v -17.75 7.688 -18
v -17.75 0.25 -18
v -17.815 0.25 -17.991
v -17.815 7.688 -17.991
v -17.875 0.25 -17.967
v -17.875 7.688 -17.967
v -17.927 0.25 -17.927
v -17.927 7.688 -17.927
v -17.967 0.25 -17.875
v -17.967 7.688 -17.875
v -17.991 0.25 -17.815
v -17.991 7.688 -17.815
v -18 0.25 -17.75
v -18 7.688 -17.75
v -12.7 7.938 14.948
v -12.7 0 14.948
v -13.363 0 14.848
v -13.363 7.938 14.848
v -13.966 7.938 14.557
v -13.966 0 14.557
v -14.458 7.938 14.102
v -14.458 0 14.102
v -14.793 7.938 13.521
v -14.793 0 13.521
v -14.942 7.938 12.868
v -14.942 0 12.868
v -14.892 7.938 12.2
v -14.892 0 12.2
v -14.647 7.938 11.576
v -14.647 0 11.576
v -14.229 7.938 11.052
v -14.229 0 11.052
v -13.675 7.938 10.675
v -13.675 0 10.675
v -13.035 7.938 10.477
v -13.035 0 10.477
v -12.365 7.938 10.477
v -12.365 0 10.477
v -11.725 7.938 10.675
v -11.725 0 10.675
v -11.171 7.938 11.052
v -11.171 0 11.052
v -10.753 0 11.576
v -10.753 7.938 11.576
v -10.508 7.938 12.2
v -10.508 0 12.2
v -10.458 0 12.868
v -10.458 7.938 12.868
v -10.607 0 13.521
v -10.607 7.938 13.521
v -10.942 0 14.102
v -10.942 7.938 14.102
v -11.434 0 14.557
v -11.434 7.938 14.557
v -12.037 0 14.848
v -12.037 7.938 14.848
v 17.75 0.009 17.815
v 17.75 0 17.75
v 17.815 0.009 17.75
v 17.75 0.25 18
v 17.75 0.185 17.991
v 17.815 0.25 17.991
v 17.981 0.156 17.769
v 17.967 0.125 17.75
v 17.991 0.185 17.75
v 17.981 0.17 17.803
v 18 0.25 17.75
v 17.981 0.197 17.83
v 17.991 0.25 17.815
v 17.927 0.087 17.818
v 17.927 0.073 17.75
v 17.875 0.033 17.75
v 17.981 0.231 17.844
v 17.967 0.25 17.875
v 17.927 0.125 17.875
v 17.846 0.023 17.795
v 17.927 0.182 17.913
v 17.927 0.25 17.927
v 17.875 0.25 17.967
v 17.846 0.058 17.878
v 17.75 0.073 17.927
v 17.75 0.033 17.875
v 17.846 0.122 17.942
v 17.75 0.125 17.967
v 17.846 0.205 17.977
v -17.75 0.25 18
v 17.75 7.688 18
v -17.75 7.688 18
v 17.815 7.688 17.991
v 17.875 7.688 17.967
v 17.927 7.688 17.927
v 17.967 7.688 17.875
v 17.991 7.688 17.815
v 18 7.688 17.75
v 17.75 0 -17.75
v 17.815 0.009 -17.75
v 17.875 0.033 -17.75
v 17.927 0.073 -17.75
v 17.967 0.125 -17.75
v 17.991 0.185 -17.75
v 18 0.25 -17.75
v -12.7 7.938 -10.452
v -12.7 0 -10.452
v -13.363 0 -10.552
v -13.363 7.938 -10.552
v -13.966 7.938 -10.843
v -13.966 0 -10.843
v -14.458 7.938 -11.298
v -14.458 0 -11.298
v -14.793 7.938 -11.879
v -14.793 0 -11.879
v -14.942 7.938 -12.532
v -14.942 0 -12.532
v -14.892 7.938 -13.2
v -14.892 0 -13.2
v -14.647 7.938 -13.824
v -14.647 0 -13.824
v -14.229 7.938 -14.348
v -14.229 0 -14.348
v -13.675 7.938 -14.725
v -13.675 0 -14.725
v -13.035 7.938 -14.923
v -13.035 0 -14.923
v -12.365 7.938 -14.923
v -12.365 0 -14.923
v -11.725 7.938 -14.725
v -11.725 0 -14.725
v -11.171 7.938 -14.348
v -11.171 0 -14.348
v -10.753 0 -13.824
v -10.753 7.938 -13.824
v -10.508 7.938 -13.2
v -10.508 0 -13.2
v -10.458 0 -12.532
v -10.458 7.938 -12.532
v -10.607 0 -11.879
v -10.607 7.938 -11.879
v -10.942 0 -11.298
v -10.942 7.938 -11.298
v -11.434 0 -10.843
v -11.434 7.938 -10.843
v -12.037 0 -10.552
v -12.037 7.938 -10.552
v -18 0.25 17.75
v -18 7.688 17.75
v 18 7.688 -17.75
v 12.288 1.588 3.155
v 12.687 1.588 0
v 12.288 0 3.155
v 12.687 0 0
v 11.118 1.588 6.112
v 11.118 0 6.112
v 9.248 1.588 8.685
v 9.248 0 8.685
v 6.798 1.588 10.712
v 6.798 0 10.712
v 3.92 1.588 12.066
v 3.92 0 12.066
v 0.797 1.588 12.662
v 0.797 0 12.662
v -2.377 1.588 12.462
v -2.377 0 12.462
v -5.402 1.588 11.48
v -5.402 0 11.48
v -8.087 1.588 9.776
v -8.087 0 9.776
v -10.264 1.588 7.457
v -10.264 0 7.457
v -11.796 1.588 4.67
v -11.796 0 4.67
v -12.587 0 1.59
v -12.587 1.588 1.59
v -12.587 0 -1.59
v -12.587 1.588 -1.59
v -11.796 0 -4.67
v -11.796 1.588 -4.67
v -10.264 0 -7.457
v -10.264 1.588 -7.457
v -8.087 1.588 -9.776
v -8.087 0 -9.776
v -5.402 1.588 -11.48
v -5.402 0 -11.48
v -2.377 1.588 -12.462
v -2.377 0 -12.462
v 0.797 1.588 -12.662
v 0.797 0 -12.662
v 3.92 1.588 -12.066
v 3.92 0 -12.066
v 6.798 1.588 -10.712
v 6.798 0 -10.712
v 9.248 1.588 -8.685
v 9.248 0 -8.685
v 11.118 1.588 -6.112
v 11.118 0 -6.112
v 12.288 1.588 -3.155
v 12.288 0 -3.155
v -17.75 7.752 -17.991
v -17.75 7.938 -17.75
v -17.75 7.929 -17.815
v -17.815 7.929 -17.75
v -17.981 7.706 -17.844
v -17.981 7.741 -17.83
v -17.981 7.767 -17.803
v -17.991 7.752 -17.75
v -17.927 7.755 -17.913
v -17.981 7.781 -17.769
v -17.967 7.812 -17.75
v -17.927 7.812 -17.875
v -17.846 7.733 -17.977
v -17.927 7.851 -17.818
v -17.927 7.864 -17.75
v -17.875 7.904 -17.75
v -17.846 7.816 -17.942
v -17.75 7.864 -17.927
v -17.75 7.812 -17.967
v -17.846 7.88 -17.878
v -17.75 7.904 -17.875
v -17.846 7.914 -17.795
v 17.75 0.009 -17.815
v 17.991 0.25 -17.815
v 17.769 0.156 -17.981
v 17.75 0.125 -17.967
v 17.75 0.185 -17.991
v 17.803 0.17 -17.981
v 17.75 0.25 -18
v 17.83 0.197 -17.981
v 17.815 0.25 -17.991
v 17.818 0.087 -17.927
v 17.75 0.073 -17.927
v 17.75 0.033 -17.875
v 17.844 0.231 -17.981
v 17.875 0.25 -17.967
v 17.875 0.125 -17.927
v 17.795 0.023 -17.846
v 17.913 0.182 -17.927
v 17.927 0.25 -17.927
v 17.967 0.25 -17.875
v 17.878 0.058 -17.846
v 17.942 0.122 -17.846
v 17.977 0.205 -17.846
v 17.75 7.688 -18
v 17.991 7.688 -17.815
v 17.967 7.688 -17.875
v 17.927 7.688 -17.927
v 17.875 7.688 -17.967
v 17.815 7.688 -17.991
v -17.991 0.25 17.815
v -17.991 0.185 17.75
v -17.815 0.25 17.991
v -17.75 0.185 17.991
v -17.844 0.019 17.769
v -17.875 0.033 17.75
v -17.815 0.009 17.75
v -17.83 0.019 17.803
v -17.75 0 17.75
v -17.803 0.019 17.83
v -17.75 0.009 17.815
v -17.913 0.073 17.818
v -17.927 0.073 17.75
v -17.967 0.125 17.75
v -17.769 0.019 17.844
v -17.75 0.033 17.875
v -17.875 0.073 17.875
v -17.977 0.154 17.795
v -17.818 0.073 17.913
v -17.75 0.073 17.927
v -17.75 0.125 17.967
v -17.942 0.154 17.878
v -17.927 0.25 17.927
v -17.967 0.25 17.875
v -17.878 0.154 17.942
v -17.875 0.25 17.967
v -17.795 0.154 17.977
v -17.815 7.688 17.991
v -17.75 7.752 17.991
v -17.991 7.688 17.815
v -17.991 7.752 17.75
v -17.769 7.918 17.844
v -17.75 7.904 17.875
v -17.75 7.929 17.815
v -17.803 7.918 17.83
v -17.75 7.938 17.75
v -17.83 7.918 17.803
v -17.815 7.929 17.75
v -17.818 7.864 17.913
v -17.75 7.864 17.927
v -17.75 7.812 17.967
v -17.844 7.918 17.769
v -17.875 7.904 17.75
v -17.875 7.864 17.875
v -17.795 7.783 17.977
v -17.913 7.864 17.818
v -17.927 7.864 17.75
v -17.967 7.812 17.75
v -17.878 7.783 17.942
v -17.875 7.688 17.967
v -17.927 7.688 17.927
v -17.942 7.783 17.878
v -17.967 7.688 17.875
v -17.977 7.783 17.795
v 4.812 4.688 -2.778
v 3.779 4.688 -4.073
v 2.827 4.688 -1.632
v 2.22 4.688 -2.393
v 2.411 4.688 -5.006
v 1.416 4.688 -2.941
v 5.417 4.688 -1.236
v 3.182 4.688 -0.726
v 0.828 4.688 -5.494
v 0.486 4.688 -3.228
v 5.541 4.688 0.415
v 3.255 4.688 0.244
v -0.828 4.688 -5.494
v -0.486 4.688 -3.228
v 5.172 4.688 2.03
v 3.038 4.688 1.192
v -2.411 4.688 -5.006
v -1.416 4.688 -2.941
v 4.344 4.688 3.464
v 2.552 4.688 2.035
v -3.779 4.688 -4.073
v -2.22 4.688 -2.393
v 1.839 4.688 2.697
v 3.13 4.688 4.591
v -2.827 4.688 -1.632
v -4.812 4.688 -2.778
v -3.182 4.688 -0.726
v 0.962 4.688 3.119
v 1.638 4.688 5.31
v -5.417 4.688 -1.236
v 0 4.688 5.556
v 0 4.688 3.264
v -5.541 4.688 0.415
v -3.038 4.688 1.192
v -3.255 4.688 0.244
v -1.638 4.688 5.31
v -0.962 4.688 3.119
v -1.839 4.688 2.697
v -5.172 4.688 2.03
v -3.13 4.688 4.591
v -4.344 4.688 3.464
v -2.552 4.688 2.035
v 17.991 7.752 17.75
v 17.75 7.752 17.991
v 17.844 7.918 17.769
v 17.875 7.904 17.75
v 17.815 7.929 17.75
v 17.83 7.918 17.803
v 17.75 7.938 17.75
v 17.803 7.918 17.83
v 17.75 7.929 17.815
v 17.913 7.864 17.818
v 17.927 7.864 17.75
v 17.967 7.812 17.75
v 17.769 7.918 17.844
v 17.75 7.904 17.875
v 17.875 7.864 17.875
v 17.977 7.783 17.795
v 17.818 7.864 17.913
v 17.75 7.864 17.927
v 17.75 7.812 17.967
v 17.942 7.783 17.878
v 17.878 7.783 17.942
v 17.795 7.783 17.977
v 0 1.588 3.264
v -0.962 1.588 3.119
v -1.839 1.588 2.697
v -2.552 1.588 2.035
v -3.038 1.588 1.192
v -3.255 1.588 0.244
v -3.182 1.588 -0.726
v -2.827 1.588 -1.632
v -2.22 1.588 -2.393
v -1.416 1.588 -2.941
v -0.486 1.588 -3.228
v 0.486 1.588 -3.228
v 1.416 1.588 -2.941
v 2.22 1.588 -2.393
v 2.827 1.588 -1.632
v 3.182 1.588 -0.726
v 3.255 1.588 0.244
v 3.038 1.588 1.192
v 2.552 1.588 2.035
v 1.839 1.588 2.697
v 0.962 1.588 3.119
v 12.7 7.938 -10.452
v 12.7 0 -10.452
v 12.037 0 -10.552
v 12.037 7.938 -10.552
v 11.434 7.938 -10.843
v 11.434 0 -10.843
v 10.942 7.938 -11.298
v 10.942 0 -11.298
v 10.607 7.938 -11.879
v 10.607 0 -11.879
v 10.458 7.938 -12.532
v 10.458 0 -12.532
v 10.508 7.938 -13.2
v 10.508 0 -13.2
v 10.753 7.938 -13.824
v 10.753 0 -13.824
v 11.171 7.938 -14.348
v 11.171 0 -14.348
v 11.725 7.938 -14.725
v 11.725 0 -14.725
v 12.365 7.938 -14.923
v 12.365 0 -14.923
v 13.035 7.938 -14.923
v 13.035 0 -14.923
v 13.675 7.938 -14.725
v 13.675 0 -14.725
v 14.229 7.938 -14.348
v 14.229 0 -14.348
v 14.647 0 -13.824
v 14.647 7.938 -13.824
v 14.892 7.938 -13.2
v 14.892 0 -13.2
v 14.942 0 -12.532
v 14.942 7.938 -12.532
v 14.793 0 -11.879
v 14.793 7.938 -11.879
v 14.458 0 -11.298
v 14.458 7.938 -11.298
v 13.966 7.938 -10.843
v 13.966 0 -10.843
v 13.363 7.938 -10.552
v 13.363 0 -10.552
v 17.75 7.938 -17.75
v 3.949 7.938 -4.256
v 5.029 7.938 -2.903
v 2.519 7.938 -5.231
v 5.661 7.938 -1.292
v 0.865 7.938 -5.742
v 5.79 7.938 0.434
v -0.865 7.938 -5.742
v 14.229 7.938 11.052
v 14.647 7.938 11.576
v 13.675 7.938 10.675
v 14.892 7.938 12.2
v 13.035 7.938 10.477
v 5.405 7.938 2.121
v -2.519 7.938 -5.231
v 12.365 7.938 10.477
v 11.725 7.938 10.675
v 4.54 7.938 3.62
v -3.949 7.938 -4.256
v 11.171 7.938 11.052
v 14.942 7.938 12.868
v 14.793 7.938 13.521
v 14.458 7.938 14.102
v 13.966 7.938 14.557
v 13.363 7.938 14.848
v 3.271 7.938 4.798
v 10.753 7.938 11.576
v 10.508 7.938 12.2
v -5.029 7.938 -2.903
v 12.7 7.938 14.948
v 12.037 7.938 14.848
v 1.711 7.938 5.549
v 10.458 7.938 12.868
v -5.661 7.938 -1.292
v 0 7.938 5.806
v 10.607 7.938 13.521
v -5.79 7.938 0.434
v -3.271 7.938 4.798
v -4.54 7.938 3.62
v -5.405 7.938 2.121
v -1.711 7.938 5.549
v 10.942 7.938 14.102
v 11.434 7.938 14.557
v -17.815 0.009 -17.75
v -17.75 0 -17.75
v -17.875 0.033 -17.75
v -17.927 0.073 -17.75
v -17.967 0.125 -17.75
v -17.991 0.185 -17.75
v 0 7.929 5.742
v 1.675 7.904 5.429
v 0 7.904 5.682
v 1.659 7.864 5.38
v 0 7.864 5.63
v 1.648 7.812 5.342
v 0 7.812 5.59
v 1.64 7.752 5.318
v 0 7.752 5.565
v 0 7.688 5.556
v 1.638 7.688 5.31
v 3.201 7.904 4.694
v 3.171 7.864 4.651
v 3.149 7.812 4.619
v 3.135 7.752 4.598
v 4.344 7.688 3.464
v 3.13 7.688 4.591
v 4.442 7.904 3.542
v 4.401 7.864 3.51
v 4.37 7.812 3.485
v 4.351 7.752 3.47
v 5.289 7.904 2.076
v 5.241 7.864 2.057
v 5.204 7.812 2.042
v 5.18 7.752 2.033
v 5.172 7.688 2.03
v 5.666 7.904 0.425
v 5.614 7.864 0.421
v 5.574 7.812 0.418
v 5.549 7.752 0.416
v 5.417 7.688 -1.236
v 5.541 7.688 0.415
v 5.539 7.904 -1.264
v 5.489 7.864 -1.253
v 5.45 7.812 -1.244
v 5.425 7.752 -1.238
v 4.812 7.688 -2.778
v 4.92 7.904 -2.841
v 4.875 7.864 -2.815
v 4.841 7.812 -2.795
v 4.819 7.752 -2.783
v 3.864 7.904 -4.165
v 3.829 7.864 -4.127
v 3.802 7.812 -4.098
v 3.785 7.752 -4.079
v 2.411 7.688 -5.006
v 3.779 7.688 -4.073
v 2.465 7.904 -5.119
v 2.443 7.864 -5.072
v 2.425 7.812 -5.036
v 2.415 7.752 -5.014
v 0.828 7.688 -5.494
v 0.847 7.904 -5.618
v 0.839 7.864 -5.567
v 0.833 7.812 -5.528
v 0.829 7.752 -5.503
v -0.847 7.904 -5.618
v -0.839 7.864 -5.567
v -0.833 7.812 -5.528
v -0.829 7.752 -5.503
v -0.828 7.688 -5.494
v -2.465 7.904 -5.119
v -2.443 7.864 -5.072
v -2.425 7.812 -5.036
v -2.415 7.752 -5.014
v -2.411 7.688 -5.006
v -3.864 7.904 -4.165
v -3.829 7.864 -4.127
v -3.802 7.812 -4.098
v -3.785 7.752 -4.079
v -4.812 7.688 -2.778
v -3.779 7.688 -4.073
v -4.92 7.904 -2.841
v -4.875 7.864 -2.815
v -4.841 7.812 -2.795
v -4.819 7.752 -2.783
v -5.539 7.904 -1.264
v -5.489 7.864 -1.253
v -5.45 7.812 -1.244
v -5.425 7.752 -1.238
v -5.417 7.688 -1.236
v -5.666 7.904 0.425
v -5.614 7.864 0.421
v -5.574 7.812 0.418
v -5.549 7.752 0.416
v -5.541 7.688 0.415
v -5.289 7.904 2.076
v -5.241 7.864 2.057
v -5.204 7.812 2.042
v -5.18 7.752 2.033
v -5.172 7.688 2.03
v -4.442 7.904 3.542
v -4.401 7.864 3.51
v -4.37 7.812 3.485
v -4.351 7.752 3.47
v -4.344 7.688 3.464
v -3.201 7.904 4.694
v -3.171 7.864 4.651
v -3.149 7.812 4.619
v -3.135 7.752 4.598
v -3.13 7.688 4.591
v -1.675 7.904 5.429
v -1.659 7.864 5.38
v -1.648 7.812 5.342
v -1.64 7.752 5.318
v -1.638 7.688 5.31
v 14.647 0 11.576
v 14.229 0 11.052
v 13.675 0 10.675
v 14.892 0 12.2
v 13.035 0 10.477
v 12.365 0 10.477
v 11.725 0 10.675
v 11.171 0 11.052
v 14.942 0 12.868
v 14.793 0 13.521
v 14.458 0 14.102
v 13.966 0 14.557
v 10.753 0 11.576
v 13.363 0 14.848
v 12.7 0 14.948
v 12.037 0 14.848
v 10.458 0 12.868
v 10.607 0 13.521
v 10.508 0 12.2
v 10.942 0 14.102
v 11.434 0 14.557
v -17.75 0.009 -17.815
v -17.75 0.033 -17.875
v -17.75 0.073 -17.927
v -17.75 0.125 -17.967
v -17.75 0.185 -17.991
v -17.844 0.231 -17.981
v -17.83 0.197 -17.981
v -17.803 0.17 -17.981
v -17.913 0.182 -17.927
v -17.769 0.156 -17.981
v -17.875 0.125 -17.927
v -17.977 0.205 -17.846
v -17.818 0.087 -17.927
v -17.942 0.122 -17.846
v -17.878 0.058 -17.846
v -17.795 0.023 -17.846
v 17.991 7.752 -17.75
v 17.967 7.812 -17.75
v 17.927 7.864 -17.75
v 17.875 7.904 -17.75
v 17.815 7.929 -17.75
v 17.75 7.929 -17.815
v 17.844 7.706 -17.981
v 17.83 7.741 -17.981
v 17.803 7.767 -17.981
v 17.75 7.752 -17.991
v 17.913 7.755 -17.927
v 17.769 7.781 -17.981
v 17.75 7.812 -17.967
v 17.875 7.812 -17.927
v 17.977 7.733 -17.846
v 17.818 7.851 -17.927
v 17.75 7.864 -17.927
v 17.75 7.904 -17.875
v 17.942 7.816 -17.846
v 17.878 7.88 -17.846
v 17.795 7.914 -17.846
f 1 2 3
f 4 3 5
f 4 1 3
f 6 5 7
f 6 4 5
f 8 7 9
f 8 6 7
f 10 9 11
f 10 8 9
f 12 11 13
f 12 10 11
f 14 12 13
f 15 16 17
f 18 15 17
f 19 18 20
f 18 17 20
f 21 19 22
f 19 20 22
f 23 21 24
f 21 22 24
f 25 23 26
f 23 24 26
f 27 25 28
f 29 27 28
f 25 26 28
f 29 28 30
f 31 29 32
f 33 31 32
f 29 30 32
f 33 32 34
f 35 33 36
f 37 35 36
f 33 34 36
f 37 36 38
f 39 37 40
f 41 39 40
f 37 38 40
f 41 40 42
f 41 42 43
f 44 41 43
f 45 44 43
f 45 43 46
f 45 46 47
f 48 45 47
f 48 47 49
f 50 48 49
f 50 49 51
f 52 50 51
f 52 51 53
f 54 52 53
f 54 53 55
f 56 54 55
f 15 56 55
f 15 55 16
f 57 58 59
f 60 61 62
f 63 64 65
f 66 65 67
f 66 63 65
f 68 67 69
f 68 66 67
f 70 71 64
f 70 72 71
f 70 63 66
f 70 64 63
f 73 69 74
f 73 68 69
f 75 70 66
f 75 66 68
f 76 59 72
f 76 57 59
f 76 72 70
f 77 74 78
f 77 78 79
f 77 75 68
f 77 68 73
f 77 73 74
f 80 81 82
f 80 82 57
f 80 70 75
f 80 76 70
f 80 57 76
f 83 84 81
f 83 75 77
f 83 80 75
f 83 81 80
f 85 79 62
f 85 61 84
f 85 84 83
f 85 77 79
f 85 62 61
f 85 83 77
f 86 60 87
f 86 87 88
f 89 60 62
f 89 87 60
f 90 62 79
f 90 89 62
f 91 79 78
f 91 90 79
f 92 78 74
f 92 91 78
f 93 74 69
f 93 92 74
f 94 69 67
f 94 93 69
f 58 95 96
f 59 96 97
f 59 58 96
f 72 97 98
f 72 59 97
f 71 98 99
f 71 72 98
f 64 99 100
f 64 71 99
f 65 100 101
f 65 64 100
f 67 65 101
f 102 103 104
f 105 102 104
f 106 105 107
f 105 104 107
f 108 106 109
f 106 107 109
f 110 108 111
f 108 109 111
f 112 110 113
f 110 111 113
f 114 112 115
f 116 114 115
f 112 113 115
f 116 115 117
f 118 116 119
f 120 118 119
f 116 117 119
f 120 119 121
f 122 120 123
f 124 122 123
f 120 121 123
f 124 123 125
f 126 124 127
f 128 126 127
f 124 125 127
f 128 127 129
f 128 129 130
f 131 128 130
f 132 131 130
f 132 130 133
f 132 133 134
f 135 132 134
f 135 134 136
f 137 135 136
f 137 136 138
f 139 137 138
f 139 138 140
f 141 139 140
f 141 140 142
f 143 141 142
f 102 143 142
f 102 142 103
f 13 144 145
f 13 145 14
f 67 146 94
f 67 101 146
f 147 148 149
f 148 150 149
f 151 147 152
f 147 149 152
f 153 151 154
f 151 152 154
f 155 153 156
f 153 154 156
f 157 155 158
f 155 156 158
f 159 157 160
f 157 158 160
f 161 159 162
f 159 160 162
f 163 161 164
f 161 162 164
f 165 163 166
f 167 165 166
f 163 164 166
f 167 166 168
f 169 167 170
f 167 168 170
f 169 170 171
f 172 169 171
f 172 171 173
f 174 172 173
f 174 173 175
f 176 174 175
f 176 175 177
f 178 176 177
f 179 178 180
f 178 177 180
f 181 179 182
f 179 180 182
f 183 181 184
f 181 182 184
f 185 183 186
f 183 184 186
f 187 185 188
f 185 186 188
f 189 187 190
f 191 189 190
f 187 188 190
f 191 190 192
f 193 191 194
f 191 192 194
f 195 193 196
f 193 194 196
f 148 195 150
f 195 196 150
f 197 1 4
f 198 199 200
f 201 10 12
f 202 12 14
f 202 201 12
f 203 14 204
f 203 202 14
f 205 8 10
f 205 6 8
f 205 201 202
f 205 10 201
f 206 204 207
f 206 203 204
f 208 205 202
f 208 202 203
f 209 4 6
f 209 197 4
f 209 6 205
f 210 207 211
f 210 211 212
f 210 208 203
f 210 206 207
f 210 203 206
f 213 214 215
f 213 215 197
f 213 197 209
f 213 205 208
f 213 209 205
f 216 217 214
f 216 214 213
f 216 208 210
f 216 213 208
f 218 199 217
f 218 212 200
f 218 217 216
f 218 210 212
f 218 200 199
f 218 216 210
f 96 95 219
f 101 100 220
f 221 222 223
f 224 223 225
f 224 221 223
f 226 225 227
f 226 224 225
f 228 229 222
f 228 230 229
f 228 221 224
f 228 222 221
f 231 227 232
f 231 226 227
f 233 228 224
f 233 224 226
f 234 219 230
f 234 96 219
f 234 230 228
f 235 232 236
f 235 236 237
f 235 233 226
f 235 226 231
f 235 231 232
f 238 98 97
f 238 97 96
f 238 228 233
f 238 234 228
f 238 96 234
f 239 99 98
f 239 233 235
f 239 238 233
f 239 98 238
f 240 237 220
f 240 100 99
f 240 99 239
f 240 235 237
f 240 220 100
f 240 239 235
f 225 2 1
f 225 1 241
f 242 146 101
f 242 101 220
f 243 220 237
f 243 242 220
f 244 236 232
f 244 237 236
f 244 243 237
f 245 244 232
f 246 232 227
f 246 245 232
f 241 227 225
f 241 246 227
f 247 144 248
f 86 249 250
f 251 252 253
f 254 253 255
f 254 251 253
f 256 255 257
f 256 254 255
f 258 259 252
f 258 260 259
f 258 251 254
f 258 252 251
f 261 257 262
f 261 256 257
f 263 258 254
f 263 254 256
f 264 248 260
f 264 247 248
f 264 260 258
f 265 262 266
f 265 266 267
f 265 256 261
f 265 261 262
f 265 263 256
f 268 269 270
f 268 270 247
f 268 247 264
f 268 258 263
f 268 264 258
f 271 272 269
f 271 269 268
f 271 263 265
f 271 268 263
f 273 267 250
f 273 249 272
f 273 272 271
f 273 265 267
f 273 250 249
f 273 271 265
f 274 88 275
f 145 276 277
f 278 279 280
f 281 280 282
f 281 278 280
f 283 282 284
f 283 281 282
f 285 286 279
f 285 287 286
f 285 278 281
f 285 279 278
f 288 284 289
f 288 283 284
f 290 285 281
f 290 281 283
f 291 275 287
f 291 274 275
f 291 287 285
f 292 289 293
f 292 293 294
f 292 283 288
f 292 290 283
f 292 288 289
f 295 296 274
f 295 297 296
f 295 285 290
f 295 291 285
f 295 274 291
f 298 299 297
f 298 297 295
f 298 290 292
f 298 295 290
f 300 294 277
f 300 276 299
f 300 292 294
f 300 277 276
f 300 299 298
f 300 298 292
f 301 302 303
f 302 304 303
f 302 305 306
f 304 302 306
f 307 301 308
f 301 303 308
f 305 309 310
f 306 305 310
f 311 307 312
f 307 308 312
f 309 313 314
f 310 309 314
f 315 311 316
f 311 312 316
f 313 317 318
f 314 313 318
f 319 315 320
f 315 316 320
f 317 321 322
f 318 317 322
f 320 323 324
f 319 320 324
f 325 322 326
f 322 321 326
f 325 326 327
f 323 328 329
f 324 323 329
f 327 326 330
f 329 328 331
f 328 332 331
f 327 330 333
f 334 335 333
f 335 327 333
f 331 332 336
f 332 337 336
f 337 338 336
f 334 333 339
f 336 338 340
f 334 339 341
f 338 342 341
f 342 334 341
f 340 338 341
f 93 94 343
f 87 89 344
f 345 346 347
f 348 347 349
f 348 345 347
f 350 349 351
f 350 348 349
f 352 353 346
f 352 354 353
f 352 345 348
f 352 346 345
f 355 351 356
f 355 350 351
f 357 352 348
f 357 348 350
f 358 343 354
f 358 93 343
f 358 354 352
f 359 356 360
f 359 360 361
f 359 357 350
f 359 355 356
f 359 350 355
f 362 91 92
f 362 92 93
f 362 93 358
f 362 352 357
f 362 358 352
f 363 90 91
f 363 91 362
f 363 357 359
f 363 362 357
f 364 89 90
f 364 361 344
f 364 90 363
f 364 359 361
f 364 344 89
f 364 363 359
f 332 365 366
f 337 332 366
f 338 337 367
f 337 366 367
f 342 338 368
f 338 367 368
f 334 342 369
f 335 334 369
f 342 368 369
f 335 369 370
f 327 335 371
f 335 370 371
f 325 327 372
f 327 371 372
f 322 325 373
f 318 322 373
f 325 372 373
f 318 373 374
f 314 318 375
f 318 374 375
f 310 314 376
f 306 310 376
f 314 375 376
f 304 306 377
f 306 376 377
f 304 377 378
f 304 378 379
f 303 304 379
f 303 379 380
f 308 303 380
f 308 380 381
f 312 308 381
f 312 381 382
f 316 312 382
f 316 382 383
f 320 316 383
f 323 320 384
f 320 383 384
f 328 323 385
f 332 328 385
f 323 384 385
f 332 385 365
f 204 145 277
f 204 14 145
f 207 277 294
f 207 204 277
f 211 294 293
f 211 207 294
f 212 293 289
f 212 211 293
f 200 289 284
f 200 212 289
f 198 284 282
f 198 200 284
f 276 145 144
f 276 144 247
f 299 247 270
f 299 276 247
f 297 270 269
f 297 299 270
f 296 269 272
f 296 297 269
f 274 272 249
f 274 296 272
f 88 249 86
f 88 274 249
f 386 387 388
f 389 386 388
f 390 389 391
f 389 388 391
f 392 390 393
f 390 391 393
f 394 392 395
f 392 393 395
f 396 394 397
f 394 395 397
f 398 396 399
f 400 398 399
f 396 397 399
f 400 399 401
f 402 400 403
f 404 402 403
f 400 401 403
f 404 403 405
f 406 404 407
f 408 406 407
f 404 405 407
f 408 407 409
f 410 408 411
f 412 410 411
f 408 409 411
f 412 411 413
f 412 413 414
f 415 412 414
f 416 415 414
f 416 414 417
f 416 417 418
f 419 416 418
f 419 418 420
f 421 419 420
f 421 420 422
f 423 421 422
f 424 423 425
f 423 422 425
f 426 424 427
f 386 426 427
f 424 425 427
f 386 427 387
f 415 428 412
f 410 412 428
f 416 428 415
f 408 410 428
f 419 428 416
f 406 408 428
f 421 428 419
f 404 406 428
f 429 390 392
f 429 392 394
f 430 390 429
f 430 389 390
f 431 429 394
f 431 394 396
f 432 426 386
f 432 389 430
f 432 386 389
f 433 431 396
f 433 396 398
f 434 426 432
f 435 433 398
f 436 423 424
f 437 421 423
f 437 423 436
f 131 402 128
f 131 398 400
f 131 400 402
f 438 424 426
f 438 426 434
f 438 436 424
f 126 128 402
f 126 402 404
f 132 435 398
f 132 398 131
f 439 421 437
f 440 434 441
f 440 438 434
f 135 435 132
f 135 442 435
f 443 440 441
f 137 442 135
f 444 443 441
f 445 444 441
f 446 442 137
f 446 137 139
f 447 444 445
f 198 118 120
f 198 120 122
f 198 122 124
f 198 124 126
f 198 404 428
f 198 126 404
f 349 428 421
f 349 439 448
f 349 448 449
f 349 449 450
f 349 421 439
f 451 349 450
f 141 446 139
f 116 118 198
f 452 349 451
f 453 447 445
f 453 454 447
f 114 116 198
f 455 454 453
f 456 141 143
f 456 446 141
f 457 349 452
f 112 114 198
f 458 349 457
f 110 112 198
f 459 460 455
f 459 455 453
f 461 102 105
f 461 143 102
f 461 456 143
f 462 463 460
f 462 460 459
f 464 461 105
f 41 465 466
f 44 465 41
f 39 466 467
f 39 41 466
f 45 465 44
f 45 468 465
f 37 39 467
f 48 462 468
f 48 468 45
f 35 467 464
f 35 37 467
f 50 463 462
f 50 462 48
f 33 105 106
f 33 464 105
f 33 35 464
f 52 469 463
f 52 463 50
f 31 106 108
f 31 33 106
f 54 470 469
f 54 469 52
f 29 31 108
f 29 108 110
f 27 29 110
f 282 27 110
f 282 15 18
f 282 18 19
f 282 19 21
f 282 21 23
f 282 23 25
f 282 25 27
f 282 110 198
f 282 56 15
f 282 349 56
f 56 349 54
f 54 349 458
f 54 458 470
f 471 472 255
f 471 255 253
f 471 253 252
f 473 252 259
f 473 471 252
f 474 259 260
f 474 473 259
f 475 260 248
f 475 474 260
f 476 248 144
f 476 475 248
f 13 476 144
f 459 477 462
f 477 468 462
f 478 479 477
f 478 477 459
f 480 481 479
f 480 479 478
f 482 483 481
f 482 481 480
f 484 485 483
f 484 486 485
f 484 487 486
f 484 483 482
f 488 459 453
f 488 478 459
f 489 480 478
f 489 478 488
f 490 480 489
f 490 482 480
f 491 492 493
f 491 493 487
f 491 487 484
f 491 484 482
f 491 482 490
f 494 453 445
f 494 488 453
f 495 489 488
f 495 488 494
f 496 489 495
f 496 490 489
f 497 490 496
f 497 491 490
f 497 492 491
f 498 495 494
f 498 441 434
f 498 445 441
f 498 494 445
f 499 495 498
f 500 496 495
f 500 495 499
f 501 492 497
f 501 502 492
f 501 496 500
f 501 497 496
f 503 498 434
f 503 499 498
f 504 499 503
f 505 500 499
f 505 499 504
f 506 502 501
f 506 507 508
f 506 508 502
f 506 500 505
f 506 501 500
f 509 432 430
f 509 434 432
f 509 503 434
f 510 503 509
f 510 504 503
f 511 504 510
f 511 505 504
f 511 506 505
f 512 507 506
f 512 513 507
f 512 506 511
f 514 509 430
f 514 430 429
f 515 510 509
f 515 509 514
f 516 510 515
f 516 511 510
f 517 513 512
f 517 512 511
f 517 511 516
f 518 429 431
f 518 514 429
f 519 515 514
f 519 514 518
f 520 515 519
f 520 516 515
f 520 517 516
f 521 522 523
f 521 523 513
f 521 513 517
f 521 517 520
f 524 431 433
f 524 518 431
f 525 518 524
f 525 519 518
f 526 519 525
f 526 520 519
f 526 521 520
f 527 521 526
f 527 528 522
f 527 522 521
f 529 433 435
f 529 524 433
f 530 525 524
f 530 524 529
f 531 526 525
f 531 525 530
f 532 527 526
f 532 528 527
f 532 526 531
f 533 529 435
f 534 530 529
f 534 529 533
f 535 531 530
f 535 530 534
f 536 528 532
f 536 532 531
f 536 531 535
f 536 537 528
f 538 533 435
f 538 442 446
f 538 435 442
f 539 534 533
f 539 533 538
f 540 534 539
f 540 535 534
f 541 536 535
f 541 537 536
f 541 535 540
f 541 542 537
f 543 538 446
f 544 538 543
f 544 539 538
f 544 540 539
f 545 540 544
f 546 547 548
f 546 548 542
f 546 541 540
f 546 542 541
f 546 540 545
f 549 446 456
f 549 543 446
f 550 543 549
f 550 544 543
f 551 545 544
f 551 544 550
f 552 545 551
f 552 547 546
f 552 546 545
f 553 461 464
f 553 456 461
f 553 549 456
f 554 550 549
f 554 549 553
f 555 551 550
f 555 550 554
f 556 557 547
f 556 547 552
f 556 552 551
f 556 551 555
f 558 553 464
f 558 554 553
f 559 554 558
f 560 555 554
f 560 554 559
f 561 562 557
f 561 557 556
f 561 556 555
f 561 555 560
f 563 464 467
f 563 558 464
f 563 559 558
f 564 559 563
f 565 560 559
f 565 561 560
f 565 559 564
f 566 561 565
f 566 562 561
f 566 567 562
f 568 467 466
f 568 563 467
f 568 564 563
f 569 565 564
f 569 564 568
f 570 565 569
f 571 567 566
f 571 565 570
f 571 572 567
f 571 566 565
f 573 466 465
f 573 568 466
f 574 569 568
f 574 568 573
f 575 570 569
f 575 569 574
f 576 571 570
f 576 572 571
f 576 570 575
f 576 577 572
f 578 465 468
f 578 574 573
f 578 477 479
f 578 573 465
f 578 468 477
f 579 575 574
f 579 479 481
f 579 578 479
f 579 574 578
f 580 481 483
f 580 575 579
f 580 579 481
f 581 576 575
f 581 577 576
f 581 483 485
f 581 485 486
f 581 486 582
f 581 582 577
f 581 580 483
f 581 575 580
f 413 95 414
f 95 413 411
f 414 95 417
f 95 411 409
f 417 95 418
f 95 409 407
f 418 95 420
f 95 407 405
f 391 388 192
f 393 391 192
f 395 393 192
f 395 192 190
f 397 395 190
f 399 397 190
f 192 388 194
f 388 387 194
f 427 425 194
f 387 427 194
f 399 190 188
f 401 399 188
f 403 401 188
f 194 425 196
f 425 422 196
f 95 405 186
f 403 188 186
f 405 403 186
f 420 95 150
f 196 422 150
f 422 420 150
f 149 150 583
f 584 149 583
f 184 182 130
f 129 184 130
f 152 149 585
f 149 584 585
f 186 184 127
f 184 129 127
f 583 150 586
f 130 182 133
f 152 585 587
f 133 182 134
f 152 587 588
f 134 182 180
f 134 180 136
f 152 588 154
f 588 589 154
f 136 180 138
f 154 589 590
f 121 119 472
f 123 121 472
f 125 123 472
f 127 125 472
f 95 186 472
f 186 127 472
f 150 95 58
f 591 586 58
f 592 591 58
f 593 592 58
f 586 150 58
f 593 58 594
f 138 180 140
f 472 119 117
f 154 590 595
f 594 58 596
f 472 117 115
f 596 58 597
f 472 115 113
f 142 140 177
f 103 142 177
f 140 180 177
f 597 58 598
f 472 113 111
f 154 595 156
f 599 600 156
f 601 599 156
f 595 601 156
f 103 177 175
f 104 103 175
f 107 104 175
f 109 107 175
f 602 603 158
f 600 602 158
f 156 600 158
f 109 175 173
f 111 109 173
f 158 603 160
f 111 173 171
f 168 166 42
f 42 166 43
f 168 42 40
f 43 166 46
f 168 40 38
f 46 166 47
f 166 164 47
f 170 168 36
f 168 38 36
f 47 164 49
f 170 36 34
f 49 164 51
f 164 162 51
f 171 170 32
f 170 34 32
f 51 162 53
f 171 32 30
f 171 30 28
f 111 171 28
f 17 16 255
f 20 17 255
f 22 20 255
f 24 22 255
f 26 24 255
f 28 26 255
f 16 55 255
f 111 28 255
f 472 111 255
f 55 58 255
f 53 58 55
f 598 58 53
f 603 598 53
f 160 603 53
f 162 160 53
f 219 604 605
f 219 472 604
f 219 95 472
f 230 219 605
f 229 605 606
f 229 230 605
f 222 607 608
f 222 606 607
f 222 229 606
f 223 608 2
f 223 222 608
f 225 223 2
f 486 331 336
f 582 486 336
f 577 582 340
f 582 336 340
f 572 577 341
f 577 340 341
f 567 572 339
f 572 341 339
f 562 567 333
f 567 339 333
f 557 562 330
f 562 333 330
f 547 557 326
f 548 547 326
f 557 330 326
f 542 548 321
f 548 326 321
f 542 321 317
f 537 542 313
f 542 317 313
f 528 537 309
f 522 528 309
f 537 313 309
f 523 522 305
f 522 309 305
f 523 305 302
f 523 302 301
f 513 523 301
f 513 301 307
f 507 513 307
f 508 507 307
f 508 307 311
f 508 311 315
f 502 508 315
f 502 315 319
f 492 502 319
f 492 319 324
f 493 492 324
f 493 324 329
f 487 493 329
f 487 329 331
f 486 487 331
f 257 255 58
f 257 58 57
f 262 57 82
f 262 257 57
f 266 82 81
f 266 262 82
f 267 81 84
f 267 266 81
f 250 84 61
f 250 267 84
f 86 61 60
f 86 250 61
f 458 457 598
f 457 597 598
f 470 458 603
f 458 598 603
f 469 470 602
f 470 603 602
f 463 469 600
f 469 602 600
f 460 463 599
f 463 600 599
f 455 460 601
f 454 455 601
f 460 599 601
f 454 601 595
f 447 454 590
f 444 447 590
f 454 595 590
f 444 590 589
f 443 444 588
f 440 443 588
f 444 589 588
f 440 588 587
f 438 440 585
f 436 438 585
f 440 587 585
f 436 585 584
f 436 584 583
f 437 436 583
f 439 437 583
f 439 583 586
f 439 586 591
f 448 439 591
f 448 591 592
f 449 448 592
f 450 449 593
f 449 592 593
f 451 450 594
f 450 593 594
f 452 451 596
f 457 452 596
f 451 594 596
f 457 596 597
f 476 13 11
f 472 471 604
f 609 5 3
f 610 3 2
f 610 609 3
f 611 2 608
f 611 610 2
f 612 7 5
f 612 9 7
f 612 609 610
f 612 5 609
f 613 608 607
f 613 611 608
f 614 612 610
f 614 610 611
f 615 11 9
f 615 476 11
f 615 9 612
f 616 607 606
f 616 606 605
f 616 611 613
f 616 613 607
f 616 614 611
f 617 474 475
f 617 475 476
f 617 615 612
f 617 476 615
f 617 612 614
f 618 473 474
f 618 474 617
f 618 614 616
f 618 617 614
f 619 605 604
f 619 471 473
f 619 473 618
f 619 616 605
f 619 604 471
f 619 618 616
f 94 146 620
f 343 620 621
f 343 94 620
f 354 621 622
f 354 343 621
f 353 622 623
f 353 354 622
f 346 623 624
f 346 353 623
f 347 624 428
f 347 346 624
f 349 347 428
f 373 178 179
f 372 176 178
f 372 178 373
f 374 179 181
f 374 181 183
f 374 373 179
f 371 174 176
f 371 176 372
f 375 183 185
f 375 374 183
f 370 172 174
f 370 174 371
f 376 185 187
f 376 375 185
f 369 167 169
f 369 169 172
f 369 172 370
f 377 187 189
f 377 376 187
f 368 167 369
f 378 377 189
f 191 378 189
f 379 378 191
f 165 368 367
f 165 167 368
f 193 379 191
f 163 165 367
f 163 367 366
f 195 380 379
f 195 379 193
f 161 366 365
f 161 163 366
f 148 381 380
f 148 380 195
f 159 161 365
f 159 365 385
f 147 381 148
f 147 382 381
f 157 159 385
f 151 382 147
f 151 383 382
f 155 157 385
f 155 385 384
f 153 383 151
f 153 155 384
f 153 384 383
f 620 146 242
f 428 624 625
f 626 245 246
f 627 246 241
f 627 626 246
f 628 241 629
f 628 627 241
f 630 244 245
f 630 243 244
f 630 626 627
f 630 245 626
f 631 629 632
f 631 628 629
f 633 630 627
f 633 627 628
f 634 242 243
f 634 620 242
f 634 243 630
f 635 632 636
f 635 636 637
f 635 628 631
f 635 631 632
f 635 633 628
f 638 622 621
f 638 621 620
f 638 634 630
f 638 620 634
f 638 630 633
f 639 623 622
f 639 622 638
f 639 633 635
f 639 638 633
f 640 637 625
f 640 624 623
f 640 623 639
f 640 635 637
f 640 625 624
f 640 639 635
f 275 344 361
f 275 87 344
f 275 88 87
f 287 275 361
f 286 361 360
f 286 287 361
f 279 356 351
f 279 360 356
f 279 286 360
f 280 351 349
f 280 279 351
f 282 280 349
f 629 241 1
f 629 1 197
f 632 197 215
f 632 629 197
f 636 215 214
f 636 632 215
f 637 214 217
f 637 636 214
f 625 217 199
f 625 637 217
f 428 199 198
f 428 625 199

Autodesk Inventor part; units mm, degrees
ref_plane "YZ Plane" through (0, 0, 0) normal (1, 0, 0) x (0, 1, 0)
ref_plane "XZ Plane" through (0, 0, 0) normal (0, 1, 0) x (-1, 0, 0)
ref_plane "XY Plane" through (0, 0, 0) normal (0, 0, 1) x (1, 0, 0)
sketch "Sketch1" plane through (0, 0, 0) normal (0, 1, 0) x (-1, 0, 0)
  line L0 (-18, 18) -> (18, 18)
  line L1 (18, 18) -> (18, -18)
  line L2 (18, -18) -> (-18, -18)
  line L3 (-18, -18) -> (-18, 18)
  line L4 (-18, 18) -> (18, -18) construction
  line L5 (18, 18) -> (-18, -18) construction
  point P0 (0, 0)
  dimension "d0" = 36
  dimension "d1" = 36
extrude "Extrusion1" add sketch "Sketch1" along normal blind 7.9375
sketch "Sketch3" plane through (0, 7.9375, 0) normal (0, 1, 0) x (1, 0, 0)
  line L0 (-12.7, -12.7) -> (12.7, -12.7) construction
  line L1 (12.7, -12.7) -> (12.7, 12.7) construction
  line L2 (12.7, 12.7) -> (-12.7, 12.7) construction
  line L3 (-12.7, 12.7) -> (-12.7, -12.7) construction
  line L4 (-12.7, -12.7) -> (12.7, 12.7) construction
  line L5 (12.7, -12.7) -> (-12.7, 12.7) construction
  point P0 (0, 0)
  dimension "d11" = 25.4
hole "Hole2" at (-12.7, 7.9375, -12.7) at (12.7, 7.9375, -12.7) at (-12.7, 7.9375, 12.7) at (12.7, 7.9375, 12.7) direction (0, -1, 0) diameter 4.496 depth 12.3 tip angle 118 clearance for "Flat Head Machine Screw (82)" size "#8" standard "Ansi Unified Screw Threads"
sketch "Sketch2" plane through (0, 7.9375, 0) normal (0, 1, 0) x (1, 0, 0)
  point P0 (0, 0)
  point P1 (0, 0)
hole "Hole1" at (0, 7.9375, 0) direction (0, -1, 0) diameter 6.528 end through all counterbore diameter 11.113 counterbore depth 3.25 clearance for "Socket Head Cap Screw" size "1/4" standard "Ansi Unified Screw Threads"
fillet "Fillet1" radius 0.25 12 edges at (-18, 3.9688, 18) (0, 0, 18) (18, 3.9688, 18) (0, 7.9375, 18) (18, 7.9375, 0) (0, 7.9375, -18) (-18, 7.9375, 0) (18, 0, 0) (18, 3.9688, -18) (-18, 0, 0) (0, 0, -18) (-18, 3.9688, -18)
fillet "Fillet2" radius 0.25 1 edges at (0, 7.9375, -5.5565)
sketch "Sketch4" plane through (0, 0, 0) normal (0, -1, 0) x (1, 0, 0)
  circle A0 centre (0, 0) radius 12.687
  dimension "d21" = 25.374
extrude "Extrusion2" cut sketch "Sketch4" against normal blind 1.5875
properties part number "ball-holder-to-post-adapter" material "ABS Plastic"
